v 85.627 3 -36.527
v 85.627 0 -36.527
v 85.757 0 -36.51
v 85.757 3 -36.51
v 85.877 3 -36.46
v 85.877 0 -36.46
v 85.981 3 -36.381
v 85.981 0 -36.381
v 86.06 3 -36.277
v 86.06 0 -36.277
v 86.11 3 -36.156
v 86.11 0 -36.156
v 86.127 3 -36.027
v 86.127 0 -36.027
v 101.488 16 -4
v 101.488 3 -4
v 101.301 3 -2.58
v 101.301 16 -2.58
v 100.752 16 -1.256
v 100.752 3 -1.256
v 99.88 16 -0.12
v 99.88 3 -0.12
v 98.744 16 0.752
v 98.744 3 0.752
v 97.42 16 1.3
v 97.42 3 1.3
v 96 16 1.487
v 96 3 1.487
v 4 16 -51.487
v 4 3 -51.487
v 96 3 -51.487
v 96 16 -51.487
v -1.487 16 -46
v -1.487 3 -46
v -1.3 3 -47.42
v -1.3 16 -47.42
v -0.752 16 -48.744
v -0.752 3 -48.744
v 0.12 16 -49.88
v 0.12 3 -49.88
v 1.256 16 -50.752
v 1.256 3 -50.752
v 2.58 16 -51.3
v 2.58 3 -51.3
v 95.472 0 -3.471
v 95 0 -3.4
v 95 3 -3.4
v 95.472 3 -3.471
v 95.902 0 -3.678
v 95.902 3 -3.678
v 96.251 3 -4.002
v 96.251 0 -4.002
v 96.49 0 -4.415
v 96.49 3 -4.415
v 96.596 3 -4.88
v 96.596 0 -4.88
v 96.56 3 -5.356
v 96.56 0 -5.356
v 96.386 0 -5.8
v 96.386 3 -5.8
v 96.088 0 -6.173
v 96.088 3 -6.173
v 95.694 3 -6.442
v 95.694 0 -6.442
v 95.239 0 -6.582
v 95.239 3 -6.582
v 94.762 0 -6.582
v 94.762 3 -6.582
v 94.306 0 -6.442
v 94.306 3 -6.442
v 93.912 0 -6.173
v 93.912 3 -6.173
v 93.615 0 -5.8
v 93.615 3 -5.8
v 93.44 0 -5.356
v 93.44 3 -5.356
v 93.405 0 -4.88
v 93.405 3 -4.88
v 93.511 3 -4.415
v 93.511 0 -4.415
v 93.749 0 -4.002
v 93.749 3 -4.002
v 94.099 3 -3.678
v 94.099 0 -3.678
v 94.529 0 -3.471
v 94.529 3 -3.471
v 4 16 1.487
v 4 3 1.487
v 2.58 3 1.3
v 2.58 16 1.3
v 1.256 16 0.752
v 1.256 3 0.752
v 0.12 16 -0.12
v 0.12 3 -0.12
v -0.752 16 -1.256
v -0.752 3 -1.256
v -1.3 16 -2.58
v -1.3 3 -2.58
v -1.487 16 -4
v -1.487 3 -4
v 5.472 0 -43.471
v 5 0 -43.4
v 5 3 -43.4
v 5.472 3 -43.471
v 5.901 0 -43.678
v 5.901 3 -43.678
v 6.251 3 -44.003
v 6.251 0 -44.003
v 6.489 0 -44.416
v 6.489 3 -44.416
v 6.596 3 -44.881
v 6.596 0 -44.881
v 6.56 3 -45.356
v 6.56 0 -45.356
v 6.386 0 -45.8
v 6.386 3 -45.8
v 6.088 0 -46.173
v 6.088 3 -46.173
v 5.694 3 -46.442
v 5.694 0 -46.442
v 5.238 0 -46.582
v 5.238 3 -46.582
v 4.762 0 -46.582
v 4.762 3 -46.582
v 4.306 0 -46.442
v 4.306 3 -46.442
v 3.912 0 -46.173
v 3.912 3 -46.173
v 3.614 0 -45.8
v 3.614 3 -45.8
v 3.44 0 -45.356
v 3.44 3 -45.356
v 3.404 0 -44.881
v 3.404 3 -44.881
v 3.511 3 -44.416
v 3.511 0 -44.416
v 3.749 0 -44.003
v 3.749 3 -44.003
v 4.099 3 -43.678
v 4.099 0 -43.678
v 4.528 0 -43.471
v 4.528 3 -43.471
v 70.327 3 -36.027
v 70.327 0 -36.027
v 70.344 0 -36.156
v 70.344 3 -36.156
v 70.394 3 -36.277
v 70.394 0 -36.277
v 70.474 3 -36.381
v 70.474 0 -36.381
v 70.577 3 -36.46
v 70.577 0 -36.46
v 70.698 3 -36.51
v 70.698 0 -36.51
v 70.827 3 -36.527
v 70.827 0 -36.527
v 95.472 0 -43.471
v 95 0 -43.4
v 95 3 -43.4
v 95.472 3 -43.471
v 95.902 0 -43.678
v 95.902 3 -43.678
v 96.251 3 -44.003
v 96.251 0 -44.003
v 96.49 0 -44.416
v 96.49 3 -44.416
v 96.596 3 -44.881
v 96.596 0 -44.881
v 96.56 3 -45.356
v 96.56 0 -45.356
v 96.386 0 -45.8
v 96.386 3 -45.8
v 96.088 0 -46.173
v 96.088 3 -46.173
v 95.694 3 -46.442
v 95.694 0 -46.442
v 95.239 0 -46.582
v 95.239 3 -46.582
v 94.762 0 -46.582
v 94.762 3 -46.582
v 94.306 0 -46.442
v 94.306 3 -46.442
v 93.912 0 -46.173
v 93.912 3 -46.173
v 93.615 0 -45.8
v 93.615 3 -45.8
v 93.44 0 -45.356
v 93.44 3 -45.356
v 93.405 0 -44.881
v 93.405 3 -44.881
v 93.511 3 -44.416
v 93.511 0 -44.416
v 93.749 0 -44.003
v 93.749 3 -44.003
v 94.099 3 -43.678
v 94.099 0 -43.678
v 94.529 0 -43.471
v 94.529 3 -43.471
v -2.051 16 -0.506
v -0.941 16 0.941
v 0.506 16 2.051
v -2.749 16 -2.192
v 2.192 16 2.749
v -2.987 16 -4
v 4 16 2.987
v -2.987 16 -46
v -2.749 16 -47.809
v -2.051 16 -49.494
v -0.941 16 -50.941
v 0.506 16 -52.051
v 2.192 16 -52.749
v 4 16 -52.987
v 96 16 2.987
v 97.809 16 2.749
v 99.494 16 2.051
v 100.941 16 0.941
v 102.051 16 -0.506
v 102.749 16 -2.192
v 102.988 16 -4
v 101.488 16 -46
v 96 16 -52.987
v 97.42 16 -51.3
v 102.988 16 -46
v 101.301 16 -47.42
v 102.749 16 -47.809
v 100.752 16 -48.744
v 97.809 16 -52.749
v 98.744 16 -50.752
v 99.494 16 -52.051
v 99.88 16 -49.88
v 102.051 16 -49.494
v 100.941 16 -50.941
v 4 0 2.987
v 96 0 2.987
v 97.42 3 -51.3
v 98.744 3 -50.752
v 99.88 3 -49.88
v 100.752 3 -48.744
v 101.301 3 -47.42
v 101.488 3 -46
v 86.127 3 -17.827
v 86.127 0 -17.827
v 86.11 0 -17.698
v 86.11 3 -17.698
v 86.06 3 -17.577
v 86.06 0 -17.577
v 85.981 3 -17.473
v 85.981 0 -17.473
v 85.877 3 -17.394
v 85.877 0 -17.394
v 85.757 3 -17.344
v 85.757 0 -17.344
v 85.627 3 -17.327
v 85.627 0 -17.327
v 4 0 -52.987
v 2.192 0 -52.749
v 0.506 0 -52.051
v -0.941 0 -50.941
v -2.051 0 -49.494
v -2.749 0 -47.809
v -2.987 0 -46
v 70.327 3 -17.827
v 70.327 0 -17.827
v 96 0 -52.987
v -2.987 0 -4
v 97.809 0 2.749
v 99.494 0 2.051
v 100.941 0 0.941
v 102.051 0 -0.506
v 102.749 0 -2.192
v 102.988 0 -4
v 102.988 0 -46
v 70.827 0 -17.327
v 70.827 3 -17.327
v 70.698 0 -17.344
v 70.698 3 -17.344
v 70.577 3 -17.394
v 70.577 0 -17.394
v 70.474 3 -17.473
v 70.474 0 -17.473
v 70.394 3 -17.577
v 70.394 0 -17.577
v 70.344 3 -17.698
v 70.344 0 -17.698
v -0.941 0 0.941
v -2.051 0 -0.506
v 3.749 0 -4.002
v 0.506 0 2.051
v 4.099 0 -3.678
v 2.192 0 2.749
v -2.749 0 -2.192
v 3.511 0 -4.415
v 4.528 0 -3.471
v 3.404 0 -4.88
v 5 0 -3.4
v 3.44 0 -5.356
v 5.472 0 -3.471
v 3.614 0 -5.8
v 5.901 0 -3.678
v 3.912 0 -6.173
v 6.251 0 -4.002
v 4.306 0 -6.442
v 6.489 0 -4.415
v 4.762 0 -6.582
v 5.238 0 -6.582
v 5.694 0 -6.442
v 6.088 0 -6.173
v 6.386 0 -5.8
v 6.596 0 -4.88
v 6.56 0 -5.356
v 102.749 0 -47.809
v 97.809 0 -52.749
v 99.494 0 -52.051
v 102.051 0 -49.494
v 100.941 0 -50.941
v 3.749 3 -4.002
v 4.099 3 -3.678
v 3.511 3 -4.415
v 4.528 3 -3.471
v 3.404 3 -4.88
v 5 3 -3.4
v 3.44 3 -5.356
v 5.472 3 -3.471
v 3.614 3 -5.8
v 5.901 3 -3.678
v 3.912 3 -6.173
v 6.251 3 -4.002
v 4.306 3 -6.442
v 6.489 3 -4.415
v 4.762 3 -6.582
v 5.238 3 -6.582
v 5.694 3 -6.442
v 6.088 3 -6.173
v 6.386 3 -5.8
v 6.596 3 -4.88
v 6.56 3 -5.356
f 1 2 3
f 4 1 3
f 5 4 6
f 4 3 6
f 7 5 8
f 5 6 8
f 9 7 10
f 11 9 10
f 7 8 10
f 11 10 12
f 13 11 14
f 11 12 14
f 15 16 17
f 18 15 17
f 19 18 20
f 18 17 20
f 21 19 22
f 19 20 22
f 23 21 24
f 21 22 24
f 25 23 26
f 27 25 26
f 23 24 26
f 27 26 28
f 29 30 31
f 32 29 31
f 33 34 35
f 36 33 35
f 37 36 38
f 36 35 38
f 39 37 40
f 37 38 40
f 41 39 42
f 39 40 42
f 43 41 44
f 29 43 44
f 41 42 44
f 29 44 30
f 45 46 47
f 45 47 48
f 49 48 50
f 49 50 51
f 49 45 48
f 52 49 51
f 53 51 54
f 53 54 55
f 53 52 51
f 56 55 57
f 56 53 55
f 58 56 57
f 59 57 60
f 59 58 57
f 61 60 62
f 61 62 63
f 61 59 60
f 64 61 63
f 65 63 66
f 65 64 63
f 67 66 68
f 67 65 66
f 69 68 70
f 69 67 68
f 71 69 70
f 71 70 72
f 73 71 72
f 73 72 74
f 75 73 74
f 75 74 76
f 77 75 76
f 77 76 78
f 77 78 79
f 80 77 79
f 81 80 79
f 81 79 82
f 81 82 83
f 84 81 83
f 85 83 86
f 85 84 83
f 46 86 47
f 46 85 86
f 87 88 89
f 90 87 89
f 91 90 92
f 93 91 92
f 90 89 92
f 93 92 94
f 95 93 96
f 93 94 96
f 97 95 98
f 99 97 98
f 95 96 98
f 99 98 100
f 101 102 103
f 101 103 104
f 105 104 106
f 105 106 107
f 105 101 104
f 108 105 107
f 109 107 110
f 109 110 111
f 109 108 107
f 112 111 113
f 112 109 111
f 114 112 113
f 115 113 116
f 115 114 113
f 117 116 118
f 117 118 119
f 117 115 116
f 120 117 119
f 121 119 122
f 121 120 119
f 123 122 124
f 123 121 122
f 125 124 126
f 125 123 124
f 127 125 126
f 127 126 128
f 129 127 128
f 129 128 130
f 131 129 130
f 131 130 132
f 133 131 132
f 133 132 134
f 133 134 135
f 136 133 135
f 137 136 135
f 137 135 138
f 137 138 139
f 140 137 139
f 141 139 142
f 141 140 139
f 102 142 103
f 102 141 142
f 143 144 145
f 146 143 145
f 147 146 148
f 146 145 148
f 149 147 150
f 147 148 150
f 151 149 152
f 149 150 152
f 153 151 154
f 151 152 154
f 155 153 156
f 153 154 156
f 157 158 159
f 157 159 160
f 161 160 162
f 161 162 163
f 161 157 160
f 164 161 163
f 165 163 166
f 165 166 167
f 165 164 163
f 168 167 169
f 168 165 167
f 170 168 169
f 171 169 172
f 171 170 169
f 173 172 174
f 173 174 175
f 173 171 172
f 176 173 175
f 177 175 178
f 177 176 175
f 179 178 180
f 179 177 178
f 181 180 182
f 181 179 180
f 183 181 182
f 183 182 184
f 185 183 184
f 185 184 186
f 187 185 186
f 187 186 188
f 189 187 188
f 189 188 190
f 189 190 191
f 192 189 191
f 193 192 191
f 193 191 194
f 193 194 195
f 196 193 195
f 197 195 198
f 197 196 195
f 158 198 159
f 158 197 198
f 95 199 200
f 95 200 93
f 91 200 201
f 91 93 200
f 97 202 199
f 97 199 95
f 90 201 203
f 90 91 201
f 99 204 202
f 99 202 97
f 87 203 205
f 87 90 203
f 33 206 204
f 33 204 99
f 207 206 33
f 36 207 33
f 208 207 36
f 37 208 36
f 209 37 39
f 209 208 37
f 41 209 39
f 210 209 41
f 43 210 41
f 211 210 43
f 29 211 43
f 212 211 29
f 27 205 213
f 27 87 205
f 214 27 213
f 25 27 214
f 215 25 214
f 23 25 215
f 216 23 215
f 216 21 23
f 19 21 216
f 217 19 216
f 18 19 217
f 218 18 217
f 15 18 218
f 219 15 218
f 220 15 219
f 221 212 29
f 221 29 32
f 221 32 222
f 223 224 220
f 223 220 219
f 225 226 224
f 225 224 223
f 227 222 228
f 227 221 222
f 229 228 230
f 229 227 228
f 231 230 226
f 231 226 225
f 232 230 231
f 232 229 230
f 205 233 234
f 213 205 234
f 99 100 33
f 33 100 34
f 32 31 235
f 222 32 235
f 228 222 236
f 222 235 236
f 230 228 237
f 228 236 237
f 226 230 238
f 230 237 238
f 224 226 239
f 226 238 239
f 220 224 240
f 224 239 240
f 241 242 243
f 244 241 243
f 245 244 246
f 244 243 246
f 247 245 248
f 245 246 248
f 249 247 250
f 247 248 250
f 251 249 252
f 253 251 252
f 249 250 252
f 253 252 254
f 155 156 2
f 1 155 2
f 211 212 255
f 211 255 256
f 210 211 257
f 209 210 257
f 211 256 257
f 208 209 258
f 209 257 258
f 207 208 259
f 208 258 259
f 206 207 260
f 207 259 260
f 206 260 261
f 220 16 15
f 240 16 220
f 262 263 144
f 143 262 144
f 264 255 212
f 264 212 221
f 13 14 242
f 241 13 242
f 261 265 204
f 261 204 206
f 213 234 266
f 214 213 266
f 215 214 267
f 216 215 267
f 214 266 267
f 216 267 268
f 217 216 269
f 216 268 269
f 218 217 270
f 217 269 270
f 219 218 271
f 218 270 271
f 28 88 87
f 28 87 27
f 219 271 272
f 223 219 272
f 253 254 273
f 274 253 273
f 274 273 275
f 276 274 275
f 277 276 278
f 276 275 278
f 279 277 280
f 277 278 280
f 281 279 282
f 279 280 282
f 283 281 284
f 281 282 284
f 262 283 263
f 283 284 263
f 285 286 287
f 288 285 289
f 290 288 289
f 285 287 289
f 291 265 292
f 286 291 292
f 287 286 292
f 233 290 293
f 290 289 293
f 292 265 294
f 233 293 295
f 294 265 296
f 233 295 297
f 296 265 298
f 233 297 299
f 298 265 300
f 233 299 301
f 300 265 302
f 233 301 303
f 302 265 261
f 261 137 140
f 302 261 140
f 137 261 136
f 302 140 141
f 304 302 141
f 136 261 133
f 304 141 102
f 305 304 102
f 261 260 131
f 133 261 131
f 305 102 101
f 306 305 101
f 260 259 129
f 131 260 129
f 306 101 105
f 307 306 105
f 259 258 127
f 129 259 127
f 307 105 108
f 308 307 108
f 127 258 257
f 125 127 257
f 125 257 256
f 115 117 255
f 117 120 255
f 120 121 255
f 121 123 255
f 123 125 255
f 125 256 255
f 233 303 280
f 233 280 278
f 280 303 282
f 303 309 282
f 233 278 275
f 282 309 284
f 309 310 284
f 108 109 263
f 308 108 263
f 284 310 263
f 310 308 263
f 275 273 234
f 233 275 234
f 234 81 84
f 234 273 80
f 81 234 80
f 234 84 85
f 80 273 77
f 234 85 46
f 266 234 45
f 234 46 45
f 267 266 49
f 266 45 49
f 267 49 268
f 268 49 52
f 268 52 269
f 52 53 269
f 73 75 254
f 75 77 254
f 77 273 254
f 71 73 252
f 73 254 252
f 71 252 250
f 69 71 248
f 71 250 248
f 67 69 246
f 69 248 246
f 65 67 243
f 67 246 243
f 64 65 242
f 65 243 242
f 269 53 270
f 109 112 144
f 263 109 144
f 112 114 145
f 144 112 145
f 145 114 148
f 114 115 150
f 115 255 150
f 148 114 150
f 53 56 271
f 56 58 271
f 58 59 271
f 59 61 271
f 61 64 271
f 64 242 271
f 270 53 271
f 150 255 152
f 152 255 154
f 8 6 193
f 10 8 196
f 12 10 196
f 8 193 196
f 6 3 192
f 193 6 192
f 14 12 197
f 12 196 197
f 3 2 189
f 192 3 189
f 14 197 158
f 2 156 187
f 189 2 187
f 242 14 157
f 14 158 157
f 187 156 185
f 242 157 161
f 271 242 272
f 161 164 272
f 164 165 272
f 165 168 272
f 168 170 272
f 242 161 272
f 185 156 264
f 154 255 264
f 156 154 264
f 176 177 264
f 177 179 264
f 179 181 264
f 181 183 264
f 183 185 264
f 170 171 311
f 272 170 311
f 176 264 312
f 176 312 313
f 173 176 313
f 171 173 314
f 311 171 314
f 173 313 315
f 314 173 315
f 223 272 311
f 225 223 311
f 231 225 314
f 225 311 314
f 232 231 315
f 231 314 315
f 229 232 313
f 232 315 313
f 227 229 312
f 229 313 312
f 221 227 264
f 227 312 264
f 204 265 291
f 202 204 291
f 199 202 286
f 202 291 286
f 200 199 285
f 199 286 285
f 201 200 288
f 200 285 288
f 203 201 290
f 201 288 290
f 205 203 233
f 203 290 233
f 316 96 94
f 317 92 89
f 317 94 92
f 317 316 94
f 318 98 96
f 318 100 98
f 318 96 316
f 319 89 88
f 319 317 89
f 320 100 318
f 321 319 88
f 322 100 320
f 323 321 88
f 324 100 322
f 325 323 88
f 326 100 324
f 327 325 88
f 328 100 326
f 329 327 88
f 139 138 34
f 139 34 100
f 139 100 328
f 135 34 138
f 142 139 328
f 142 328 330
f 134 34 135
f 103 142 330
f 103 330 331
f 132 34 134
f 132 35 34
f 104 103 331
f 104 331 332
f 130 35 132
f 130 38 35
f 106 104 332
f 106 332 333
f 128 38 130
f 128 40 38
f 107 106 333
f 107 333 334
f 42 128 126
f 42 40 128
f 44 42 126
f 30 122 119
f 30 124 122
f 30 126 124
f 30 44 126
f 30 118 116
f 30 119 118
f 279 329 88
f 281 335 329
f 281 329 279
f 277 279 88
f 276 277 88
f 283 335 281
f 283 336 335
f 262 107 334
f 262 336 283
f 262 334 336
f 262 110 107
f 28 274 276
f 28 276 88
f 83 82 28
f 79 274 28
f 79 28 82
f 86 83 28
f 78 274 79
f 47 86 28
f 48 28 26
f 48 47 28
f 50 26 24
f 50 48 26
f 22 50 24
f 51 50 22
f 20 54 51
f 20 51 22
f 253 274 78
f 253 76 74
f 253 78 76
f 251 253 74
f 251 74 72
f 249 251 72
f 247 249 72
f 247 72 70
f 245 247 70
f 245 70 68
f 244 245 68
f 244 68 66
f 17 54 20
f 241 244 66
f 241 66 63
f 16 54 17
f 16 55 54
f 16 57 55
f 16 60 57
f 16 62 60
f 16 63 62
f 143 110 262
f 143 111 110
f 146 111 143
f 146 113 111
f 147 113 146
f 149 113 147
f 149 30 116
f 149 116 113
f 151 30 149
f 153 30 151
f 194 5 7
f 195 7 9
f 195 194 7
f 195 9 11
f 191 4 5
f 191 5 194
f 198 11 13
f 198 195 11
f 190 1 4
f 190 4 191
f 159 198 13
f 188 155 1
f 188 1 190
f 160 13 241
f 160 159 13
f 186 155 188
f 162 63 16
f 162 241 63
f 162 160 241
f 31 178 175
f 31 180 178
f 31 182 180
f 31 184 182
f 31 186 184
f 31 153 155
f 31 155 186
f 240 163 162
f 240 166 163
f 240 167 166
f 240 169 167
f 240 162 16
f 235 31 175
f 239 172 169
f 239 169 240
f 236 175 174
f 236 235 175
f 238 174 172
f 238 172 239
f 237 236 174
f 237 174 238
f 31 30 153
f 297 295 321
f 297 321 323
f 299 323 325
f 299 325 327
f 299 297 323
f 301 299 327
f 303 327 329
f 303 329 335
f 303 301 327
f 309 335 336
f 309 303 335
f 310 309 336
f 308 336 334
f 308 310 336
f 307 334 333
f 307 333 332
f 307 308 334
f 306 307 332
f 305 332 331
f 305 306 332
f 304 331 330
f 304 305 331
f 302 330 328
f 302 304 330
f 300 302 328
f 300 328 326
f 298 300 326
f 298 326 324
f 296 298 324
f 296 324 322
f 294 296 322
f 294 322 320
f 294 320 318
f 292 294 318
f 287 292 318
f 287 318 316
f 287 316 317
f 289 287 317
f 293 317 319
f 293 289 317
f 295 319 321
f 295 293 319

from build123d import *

# Parameters (mm, degrees)
SKETCH1_R           = 1.600003175
BOSS_EXTRUDE1_DEPTH = 3
BOSS_EXTRUDE2_DEPTH = 16


with BuildPart() as part:
    # Sketch1 → Boss-Extrude1 (new body)
    with BuildSketch(Plane(origin=(0, 0, 0), x_dir=(1, 0, 0), z_dir=(0, 1, 0))):
        with BuildLine():
            ThreePointArc((102.987500635, 46.00009144), (100.940965623, 50.940864023), (96.00019304, 52.987399035))
            Line((96.00019304, 52.987399035), (4.00000762, 52.987399035))
            ThreePointArc((4.00000762, 52.987399035), (-0.940764962, 50.940864023), (-2.987299975, 46.00009144))
            Line((-2.987299975, 46.00009144), (-2.987299975, 4.00000762))
            ThreePointArc((-2.987299975, 4.00000762), (-0.940764962, -0.940764962), (4.00000762, -2.987299975))
            Line((4.00000762, -2.987299975), (96.00019304, -2.987299975))
            ThreePointArc((96.00019304, -2.987299975), (100.940965623, -0.940764962), (102.987500635, 4.00000762))
            Line((102.987500635, 4.00000762), (102.987500635, 46.00009144))
        make_face()
        with Locations((5.00001016, 5.00001016)):
            Circle(SKETCH1_R, mode=Mode.SUBTRACT)
        with Locations((95.0001905, 5.00001016)):
            Circle(SKETCH1_R, mode=Mode.SUBTRACT)
        with Locations((5.00001016, 45.0000889)):
            Circle(SKETCH1_R, mode=Mode.SUBTRACT)
        with BuildLine():
            ThreePointArc((70.327156827, 36.027051041), (70.473603433, 36.380604424), (70.827156816, 36.52705103))
            Line((70.827156816, 36.52705103), (85.627156504, 36.52705103))
            ThreePointArc((85.627156504, 36.52705103), (85.980709887, 36.380604424), (86.127156493, 36.027051041))
            Line((86.127156493, 36.027051041), (86.127156493, 17.827051425))
            ThreePointArc((86.127156493, 17.827051425), (85.980709887, 17.473498042), (85.627156504, 17.327051436))
            Line((85.627156504, 17.327051436), (70.827156816, 17.327051436))
            ThreePointArc((70.827156816, 17.327051436), (70.473603433, 17.473498042), (70.327156827, 17.827051425))
            Line((70.327156827, 17.827051425), (70.327156827, 36.027051041))
        make_face(mode=Mode.SUBTRACT)
        with Locations((95.0001905, 45.0000889)):
            Circle(SKETCH1_R, mode=Mode.SUBTRACT)
    extrude(amount=BOSS_EXTRUDE1_DEPTH)

    # Sketch1<3> → Boss-Extrude2 (add)
    with BuildSketch(Plane(origin=(0, 0, 0), x_dir=(1, 0, 0), z_dir=(0, 1, 0))):
        with BuildLine():
            Line((96.00019304, 52.987399035), (4.00000762, 52.987399035))
            ThreePointArc((4.00000762, 52.987399035), (-0.940764962, 50.940864023), (-2.987299975, 46.00009144))
            Line((-2.987299975, 46.00009144), (-2.987299975, 4.00000762))
            ThreePointArc((-2.987299975, 4.00000762), (-0.940764962, -0.940764962), (4.00000762, -2.987299975))
            Line((4.00000762, -2.987299975), (96.00019304, -2.987299975))
            ThreePointArc((96.00019304, -2.987299975), (100.940965623, -0.940764962), (102.987500635, 4.00000762))
            Line((102.987500635, 4.00000762), (102.987500635, 46.00009144))
            ThreePointArc((102.987500635, 46.00009144), (100.940965623, 50.940864023), (96.00019304, 52.987399035))
        make_face()
        with BuildLine():
            Line((4.00000762, 51.487399035), (96.00019304, 51.487399035))
            ThreePointArc((96.00019304, 51.487399035), (99.880305451, 49.880203851), (101.487500635, 46.00009144))
            Line((101.487500635, 46.00009144), (101.487500635, 4.00000762))
            ThreePointArc((101.487500635, 4.00000762), (99.880305451, 0.119895209), (96.00019304, -1.487299975))
            Line((96.00019304, -1.487299975), (4.00000762, -1.487299975))
            ThreePointArc((4.00000762, -1.487299975), (0.119895209, 0.119895209), (-1.487299975, 4.00000762))
            Line((-1.487299975, 4.00000762), (-1.487299975, 46.00009144))
            ThreePointArc((-1.487299975, 46.00009144), (0.119895209, 49.880203851), (4.00000762, 51.487399035))
        make_face(mode=Mode.SUBTRACT)
    extrude(amount=BOSS_EXTRUDE2_DEPTH)


solid = part.part
